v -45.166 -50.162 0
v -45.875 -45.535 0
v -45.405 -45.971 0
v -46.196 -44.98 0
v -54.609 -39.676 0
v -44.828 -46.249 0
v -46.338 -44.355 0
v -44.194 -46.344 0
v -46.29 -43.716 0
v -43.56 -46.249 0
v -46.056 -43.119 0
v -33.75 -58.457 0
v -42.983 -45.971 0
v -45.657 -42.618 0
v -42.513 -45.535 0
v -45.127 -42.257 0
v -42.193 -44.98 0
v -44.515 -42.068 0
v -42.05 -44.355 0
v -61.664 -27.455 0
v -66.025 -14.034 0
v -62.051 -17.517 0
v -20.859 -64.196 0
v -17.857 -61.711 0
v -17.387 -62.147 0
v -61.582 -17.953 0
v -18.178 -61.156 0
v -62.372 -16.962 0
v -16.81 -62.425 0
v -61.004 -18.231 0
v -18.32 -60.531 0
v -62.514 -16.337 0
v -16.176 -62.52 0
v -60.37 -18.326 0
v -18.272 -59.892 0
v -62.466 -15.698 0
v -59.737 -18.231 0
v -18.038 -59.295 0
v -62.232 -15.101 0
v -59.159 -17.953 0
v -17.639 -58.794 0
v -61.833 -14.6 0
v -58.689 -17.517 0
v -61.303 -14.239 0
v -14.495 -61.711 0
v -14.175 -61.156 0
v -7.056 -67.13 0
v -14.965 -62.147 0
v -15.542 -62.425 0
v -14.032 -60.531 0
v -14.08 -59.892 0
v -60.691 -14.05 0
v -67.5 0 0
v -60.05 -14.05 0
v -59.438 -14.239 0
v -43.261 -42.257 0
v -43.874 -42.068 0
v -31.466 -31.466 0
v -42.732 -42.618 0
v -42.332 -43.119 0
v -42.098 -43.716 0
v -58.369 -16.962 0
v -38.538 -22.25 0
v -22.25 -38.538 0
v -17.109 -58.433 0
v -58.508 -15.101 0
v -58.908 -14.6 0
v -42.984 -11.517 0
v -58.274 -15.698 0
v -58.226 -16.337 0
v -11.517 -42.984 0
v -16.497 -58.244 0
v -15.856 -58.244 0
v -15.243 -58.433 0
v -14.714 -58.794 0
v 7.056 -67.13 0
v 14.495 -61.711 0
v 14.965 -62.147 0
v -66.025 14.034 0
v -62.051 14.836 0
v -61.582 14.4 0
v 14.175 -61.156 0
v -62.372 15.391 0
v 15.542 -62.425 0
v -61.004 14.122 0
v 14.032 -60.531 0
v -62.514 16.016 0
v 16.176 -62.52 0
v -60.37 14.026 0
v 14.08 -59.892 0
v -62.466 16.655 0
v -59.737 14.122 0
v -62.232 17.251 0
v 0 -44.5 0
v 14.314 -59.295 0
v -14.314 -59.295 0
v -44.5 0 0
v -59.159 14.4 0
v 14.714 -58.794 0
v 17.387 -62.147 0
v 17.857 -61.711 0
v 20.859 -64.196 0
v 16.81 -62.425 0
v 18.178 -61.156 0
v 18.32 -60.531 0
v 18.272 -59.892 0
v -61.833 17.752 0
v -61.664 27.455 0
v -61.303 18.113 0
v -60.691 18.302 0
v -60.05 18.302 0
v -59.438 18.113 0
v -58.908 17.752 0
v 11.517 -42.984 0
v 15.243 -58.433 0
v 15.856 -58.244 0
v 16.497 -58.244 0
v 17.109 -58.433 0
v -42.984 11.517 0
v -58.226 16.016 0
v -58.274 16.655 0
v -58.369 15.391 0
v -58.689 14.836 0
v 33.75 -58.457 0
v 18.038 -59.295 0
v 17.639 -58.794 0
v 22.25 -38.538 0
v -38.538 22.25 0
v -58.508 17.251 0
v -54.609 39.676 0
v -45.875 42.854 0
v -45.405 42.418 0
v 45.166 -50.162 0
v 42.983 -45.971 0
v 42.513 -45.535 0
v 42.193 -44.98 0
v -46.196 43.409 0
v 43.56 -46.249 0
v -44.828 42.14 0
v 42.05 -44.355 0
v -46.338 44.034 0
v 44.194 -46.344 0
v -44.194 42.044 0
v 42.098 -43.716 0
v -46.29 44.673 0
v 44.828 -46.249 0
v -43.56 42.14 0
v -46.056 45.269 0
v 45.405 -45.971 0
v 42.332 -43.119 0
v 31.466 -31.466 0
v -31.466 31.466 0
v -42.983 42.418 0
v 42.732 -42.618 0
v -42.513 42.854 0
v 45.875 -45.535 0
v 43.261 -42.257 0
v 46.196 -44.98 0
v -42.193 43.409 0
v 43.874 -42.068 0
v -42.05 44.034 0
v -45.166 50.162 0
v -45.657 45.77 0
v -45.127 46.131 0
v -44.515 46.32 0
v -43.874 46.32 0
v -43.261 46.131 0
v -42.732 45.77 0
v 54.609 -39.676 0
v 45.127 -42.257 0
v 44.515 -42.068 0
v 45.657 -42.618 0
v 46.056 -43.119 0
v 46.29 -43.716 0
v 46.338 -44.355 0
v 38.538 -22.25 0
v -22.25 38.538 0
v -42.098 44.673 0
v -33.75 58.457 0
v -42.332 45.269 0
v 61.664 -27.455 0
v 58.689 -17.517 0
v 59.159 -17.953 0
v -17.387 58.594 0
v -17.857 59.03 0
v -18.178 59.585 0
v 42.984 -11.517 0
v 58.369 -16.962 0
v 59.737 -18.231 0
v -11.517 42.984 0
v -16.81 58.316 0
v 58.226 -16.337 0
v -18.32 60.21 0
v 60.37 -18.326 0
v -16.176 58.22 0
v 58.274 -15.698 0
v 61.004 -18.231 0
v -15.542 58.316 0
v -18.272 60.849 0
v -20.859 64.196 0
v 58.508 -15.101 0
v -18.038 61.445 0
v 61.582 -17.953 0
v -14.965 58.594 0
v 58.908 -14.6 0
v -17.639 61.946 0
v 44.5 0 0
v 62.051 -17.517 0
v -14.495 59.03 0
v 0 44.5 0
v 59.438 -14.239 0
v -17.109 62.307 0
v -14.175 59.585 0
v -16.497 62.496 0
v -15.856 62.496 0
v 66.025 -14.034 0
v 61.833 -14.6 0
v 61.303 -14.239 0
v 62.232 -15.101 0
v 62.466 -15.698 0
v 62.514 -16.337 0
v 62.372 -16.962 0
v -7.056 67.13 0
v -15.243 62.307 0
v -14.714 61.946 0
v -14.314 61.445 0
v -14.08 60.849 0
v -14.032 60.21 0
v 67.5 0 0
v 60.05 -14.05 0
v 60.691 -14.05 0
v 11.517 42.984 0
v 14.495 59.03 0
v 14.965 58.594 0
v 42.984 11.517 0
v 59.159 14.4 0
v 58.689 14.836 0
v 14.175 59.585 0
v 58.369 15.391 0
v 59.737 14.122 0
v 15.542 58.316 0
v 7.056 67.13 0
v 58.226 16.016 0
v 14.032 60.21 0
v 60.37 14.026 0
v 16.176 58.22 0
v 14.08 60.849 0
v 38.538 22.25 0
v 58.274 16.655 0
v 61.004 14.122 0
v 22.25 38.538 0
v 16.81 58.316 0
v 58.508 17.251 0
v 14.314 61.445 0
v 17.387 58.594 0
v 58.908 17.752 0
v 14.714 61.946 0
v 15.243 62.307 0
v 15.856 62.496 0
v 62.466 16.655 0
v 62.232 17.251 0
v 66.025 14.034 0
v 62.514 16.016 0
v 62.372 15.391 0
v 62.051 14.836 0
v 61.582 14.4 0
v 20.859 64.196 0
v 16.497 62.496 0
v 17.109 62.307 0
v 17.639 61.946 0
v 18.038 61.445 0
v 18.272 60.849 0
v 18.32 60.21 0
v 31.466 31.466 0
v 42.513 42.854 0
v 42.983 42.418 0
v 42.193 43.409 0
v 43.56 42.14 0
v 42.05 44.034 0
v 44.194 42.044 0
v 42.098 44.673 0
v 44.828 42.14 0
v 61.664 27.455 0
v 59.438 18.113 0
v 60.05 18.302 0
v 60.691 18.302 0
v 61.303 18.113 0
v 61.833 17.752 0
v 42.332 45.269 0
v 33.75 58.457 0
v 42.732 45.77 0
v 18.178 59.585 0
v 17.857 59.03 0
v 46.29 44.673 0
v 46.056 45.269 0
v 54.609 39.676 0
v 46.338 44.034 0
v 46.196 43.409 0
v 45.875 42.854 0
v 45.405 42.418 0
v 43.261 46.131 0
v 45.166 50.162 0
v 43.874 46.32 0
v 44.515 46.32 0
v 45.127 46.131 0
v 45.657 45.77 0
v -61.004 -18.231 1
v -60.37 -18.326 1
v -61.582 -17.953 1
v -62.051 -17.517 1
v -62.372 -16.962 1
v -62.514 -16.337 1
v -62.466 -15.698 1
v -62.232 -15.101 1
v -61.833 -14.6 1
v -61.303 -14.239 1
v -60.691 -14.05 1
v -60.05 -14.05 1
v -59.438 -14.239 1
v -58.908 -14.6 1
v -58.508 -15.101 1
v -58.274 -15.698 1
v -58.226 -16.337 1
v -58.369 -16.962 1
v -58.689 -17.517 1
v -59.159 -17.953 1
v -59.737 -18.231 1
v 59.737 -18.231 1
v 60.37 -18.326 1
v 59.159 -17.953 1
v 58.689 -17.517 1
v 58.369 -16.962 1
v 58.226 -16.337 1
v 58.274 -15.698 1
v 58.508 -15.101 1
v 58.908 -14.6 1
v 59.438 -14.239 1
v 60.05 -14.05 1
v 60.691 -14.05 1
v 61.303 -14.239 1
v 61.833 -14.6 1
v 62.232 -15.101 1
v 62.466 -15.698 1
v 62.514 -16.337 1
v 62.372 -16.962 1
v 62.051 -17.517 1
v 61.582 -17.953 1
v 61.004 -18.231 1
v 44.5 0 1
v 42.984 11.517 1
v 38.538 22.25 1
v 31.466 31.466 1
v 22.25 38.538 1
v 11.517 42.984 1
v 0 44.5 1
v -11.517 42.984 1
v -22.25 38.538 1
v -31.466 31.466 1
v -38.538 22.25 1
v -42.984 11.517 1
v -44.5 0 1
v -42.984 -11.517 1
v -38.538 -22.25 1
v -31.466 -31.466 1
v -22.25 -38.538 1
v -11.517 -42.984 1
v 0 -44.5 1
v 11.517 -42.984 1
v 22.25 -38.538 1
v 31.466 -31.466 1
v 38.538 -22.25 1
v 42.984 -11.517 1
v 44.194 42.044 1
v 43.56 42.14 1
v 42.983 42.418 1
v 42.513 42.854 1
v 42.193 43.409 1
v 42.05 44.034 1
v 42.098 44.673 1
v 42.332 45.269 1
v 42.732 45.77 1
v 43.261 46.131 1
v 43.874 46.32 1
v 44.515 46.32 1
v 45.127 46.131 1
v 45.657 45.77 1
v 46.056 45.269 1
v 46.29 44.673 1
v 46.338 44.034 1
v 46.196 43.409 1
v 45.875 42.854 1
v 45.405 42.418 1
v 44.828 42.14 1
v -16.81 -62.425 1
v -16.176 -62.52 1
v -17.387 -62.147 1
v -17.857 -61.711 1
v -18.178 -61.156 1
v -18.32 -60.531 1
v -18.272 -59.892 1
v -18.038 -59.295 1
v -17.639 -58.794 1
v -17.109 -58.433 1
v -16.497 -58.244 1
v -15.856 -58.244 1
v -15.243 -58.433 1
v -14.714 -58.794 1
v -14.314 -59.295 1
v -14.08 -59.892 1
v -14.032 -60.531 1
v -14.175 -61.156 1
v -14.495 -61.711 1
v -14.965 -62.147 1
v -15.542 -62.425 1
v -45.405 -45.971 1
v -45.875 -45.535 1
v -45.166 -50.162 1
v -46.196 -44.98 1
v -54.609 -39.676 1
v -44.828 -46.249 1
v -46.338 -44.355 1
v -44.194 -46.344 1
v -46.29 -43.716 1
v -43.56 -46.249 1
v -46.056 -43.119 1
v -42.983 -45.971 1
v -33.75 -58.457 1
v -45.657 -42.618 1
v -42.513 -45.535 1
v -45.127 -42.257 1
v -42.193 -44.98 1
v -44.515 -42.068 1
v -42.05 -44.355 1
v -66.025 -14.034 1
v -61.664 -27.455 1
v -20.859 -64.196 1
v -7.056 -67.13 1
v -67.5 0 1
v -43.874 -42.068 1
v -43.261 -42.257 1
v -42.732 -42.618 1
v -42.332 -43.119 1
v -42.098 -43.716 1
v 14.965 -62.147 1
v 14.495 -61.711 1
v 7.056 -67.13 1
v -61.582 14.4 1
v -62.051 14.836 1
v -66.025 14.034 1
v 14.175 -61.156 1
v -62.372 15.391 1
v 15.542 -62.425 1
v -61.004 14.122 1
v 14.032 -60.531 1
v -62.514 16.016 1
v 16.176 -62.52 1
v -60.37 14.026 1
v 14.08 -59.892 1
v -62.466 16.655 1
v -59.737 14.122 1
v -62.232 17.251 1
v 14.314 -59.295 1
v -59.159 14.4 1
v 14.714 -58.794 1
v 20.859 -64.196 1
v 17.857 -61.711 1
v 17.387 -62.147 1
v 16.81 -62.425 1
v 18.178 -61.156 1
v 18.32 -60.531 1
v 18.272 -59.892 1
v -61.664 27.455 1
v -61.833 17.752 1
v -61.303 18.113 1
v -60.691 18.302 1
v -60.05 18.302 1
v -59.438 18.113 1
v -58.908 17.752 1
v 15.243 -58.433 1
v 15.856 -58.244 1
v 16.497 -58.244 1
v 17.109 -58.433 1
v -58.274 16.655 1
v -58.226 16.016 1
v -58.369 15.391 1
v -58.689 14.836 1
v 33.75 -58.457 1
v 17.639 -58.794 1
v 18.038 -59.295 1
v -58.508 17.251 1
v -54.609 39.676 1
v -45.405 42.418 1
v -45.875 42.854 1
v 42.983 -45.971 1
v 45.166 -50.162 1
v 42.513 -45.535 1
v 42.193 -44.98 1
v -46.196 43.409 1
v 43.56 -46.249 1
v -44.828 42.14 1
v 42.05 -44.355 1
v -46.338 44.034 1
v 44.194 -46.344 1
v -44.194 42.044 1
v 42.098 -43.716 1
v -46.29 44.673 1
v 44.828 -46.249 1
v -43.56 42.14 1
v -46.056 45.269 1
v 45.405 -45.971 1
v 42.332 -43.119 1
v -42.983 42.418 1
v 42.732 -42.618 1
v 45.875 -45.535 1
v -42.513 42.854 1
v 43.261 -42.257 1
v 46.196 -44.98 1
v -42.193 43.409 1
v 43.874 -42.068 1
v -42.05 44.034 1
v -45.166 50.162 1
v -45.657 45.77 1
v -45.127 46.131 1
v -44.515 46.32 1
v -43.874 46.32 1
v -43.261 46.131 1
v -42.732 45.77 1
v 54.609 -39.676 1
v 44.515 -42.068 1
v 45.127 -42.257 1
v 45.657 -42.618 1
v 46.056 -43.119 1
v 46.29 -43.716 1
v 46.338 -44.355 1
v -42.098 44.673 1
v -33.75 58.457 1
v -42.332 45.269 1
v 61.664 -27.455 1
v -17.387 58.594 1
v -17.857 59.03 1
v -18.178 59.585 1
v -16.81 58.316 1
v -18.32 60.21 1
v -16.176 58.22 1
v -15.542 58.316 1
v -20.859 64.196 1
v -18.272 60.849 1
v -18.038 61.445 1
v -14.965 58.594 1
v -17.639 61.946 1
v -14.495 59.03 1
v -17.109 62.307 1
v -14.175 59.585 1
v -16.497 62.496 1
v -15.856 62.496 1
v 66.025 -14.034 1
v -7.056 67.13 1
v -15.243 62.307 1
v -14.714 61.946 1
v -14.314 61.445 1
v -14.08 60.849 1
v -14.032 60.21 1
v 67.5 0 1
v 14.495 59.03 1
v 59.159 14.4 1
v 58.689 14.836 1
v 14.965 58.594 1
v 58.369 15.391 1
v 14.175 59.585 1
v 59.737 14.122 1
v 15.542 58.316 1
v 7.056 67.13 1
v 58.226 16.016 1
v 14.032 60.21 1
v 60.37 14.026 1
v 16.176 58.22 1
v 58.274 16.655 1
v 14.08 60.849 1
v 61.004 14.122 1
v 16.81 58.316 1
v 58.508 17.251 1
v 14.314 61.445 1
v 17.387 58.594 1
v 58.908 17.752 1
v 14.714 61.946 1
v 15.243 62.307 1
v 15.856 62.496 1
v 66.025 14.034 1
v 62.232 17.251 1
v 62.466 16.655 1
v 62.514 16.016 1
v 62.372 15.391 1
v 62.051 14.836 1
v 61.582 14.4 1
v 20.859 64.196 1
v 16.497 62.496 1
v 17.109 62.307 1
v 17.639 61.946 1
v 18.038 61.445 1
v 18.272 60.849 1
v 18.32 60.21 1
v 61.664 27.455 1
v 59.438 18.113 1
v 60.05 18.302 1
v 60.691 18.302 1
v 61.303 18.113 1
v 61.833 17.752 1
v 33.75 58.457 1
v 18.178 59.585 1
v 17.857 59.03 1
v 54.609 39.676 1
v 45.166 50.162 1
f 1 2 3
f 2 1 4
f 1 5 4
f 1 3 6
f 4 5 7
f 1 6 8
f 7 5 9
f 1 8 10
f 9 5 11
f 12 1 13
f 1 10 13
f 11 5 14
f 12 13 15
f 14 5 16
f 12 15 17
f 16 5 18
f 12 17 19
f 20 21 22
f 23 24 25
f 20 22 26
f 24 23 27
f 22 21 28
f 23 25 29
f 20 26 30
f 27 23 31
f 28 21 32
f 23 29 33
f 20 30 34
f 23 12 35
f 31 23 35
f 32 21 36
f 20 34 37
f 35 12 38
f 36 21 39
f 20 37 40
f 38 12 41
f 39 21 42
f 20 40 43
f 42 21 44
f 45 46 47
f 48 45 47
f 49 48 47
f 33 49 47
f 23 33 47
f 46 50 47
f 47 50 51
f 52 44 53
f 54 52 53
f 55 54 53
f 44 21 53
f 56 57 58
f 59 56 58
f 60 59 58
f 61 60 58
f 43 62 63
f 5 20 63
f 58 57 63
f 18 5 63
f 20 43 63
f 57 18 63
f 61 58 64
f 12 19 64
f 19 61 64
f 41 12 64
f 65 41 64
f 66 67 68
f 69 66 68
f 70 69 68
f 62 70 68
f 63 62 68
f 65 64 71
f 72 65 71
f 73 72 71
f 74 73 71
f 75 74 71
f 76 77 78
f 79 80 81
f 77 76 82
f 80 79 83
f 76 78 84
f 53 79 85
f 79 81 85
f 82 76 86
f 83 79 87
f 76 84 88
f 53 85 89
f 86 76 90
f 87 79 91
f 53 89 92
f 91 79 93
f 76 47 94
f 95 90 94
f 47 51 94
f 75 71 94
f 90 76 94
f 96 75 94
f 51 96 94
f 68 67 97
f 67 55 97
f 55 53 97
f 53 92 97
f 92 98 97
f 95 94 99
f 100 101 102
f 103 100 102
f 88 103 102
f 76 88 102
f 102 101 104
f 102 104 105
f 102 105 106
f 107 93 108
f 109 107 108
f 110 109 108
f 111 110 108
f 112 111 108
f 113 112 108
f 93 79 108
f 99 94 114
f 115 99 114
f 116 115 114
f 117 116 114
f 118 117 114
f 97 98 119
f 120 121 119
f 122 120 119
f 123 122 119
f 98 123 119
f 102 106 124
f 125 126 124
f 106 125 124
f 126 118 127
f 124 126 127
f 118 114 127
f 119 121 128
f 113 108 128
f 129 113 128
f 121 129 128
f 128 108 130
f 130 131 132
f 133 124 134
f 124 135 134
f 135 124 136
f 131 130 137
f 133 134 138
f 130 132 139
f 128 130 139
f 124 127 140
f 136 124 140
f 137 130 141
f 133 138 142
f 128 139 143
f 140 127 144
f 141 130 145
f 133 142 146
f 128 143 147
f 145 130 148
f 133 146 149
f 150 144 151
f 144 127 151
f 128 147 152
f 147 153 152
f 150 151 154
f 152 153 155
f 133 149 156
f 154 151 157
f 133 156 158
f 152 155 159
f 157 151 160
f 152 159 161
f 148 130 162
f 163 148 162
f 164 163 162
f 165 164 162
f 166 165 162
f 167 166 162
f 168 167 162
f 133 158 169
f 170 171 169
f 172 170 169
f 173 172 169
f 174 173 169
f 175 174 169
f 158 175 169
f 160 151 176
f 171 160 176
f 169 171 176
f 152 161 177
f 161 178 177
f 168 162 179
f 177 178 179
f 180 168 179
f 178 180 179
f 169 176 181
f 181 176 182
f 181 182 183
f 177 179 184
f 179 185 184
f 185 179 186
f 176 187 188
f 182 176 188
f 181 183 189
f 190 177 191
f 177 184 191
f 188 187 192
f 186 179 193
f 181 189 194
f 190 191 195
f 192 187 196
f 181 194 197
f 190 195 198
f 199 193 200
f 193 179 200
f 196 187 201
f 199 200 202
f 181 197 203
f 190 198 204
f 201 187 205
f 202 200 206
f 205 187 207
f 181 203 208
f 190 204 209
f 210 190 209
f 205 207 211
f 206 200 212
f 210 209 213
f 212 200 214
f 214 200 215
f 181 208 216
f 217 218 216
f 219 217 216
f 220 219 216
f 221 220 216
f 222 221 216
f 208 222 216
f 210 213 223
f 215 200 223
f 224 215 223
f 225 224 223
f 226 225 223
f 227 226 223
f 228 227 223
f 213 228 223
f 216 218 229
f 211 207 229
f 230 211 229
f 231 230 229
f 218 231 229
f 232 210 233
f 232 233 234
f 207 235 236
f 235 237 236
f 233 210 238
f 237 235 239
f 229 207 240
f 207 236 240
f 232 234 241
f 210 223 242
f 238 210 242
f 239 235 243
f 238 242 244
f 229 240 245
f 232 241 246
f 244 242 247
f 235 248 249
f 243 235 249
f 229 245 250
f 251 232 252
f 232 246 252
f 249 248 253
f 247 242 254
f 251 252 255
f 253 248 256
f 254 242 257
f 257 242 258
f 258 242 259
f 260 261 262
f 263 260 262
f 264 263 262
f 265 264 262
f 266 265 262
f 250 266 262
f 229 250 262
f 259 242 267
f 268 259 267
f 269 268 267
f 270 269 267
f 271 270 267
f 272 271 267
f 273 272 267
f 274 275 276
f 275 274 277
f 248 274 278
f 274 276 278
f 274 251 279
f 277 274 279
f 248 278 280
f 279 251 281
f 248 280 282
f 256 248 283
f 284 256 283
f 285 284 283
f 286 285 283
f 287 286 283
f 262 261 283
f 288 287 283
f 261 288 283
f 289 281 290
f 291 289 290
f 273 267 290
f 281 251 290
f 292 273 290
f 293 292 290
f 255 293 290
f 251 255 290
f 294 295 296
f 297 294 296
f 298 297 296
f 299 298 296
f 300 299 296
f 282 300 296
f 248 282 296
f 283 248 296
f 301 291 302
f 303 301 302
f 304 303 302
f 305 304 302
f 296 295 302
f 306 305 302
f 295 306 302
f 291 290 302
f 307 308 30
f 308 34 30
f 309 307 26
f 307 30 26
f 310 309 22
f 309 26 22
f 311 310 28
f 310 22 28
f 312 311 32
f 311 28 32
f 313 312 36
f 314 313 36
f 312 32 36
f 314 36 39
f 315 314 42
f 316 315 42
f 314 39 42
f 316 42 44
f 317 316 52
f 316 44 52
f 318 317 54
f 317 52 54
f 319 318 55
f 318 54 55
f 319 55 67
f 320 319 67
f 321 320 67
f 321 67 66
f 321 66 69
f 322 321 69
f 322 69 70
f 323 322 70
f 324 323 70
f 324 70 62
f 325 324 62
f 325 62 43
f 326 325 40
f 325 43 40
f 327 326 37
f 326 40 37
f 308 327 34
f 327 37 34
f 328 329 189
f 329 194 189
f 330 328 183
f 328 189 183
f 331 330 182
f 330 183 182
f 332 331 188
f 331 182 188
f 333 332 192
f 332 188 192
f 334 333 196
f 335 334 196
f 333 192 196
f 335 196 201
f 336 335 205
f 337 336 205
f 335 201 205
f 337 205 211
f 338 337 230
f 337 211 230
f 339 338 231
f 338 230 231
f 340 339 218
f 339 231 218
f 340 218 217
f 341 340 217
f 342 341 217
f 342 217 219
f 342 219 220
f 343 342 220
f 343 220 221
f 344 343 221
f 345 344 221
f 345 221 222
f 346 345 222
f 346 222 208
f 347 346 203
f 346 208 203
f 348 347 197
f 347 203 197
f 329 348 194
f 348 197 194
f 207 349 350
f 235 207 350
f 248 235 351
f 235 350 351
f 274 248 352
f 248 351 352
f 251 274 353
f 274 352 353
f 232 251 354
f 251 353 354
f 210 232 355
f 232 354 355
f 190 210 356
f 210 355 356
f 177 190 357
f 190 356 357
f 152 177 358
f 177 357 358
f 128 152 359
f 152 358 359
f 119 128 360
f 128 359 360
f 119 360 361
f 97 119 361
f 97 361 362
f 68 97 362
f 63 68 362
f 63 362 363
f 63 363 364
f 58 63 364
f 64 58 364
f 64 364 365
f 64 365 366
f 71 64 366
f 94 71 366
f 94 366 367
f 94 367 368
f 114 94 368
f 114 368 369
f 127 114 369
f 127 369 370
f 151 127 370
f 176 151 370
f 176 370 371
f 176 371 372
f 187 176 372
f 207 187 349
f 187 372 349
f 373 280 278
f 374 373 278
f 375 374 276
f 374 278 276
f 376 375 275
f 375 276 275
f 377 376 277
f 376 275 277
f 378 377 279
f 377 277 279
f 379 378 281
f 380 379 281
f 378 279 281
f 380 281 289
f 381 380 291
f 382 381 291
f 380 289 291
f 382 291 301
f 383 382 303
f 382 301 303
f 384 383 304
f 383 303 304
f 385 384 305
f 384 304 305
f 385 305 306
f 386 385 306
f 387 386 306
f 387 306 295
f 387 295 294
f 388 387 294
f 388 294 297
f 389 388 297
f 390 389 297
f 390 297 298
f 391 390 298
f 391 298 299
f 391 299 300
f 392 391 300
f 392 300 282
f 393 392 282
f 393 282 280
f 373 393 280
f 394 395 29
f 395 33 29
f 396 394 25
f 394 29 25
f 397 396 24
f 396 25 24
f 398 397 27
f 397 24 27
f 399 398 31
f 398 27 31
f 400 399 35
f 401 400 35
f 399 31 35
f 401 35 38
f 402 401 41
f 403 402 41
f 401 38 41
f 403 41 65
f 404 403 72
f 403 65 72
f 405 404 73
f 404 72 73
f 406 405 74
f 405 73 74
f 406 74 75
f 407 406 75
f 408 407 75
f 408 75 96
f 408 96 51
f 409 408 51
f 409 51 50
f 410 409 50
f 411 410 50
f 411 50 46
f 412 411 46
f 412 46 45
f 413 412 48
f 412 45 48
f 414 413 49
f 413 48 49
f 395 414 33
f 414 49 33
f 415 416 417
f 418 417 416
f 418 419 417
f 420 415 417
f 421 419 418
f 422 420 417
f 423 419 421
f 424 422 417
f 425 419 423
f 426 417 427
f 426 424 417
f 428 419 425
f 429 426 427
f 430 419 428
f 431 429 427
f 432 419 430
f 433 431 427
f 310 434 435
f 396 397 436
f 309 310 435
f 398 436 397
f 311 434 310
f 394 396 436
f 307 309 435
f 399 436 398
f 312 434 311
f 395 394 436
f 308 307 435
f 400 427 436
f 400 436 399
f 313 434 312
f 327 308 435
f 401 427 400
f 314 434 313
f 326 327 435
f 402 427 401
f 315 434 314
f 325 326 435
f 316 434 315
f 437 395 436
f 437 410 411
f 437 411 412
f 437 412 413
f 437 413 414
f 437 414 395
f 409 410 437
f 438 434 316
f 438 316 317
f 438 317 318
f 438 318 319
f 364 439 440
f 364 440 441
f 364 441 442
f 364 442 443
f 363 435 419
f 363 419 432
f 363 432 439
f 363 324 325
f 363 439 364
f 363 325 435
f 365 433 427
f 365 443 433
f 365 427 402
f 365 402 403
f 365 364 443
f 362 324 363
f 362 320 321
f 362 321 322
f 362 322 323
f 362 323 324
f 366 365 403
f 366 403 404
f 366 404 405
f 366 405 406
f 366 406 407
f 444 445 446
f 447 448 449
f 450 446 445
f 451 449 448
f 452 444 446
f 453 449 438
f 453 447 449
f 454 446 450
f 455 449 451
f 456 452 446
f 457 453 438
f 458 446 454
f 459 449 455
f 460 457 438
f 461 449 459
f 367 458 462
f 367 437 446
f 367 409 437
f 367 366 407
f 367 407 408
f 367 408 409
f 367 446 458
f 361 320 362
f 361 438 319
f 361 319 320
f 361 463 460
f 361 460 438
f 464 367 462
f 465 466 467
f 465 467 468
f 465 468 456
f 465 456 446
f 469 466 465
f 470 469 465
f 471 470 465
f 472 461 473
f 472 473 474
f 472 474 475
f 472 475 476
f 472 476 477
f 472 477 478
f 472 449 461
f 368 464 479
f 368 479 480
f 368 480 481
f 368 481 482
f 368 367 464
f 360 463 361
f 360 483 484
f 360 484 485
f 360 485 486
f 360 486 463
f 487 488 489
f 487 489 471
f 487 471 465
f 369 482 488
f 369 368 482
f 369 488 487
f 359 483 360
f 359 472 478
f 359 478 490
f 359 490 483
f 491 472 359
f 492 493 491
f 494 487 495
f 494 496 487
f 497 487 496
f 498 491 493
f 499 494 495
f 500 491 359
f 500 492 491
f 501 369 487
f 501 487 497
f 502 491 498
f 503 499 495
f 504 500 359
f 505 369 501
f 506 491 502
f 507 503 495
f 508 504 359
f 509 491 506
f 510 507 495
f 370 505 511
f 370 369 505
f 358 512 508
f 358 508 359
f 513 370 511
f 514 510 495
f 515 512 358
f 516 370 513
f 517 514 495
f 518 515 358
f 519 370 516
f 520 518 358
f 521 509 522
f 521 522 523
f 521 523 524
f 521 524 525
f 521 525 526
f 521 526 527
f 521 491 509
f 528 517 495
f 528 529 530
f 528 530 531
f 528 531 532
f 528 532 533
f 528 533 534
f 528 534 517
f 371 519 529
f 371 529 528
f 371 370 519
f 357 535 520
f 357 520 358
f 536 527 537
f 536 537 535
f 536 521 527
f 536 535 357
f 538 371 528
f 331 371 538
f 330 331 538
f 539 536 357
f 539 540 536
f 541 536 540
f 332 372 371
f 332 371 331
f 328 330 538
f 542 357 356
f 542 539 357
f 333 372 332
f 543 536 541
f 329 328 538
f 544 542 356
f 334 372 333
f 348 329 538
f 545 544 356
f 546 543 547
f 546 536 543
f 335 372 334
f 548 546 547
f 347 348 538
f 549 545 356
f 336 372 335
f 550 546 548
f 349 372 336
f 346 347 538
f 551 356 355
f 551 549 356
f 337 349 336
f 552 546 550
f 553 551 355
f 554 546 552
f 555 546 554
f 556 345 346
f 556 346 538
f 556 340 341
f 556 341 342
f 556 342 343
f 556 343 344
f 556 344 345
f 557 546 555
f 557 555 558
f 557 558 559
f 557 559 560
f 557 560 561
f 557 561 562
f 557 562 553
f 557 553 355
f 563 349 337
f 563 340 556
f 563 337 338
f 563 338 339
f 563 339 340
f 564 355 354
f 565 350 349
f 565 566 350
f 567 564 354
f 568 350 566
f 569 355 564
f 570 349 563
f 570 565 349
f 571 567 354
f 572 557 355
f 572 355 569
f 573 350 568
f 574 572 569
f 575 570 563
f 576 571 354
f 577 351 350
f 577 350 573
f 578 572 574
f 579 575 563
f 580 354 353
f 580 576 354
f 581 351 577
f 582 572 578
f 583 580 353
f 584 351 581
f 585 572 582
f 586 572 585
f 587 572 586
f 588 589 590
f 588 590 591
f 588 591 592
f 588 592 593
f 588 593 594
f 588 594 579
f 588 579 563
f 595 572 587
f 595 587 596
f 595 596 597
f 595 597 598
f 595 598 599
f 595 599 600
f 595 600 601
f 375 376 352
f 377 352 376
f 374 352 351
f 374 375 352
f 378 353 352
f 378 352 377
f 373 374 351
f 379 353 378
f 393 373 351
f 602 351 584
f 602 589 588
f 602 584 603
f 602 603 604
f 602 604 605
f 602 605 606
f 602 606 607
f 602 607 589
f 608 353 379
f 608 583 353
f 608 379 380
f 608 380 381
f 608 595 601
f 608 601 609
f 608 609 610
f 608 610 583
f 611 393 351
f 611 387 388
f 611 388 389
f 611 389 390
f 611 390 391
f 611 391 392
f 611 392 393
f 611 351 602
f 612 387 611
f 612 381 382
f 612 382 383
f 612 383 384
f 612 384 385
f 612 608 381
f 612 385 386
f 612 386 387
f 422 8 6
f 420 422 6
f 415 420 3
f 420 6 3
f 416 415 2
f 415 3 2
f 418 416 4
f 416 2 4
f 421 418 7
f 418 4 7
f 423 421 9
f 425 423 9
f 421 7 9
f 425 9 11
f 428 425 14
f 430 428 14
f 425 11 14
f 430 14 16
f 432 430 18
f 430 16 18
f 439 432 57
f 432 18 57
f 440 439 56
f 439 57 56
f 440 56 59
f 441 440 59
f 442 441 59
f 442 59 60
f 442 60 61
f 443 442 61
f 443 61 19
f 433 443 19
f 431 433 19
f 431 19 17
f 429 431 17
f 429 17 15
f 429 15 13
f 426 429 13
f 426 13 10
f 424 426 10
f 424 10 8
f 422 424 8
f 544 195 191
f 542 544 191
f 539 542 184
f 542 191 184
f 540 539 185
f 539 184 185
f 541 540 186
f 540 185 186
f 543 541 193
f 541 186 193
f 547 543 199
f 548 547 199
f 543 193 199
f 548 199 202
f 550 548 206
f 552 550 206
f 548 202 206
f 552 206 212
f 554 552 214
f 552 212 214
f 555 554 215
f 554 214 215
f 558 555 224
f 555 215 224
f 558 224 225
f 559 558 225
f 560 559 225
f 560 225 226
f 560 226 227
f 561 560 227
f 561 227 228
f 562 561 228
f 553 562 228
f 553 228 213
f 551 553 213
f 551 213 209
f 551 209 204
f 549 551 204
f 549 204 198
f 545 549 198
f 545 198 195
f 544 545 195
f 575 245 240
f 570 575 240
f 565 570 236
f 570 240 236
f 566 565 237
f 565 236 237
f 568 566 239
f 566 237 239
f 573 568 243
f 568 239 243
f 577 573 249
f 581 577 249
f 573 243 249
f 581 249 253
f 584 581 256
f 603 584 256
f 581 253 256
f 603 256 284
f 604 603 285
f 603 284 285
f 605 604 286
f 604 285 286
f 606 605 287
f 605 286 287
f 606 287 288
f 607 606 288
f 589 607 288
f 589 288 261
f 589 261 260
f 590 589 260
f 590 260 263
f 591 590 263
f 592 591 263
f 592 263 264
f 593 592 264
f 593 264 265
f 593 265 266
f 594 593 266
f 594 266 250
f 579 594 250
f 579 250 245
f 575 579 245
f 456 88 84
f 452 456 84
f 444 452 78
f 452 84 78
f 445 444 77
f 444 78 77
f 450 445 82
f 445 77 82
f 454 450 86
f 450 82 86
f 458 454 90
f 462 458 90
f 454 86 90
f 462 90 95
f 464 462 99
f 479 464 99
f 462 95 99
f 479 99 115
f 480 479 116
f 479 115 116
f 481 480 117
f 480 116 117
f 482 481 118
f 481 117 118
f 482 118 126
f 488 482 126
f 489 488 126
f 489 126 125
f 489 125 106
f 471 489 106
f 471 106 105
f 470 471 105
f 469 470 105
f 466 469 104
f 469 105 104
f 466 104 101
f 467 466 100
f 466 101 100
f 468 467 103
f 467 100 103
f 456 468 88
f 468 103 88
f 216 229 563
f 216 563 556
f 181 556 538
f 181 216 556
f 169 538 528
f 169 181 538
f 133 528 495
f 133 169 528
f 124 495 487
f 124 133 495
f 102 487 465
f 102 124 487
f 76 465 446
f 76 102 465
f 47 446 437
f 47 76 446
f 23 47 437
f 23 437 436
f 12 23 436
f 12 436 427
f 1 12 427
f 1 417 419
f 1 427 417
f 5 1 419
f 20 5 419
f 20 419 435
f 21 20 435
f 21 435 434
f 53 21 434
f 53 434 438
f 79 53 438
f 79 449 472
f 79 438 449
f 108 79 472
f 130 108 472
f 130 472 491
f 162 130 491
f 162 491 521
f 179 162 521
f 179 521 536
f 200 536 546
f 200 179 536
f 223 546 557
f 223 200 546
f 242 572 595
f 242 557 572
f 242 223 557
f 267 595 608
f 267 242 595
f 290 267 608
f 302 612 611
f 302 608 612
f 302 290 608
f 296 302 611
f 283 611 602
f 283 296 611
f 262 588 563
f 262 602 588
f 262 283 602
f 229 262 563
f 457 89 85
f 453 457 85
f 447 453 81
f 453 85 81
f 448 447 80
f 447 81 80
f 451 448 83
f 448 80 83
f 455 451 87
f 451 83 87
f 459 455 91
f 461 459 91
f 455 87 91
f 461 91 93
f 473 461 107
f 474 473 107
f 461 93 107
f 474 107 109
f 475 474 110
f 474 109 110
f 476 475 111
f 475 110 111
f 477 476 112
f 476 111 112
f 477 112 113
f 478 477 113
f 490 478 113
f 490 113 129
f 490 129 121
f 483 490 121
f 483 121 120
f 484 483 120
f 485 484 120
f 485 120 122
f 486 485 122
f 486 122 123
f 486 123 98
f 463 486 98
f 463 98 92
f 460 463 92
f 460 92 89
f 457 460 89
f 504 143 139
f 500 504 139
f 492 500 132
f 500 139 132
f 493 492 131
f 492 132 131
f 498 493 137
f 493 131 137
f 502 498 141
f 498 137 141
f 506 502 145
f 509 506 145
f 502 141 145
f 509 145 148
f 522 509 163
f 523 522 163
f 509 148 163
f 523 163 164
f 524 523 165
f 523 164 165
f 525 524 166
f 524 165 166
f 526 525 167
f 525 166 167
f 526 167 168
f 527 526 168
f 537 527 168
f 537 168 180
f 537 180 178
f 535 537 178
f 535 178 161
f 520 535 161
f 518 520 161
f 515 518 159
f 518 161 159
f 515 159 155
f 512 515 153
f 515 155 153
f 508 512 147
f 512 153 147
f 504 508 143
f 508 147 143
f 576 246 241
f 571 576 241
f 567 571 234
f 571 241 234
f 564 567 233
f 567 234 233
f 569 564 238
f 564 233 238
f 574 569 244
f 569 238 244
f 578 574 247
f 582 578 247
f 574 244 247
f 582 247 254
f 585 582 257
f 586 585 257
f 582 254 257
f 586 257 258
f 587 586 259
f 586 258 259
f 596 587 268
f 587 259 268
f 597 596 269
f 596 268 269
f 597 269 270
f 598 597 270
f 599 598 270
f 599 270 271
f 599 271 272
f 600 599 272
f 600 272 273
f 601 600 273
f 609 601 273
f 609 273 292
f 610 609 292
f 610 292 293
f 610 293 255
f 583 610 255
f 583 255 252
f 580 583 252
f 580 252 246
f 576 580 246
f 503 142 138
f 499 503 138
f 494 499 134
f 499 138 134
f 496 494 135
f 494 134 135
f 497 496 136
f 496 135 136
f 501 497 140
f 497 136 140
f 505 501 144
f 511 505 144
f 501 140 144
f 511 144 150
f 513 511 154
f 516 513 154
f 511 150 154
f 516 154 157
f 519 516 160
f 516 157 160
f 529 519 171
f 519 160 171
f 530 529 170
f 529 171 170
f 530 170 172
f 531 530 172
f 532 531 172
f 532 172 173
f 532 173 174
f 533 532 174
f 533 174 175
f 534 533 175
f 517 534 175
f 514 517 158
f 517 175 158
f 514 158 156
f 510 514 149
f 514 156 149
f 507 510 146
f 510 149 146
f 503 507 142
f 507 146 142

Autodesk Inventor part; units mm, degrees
ref_plane "YZ Plane" through (0, 0, 0) normal (1, 0, 0) x (0, 1, 0)
ref_plane "XZ Plane" through (0, 0, 0) normal (0, 1, 0) x (-1, 0, 0)
ref_plane "XY Plane" through (0, 0, 0) normal (0, 0, 1) x (1, 0, 0)
sketch "スケッチ4" plane through (0, 0, 1) normal (0, 0, 1) x (1, 0, 0)
  circle A0 centre (16.1762, 60.3704) radius 2.15 projected
  circle A1 centre (-16.1762, 60.3704) radius 2.15 projected
  circle A2 centre (0, 0) radius 67.5 projected
  circle A3 centre (-16.1762, 60.3704) radius 5
  circle A4 centre (16.1762, 60.3704) radius 5
  circle A5 centre (0, 0) radius 62.5
  point P0 (-11.2987, 61.4702)
  point P1 (11.2987, 61.4702)
  point P2 (17.4703, 65.2)
  point P3 (-17.4703, 65.2)
sketch "スケッチ1" plane through (0, 0, 0) normal (0, 0, 1) x (1, 0, 0)
  circle A0 centre (0, 0) radius 67.5
  dimension "d0" = 135
extrude "プレート1" add sketch "スケッチ1" along normal blind 1
sketch "スケッチ2" plane through (0, 0, 1) normal (0, 0, 1) x (1, 0, 0)
  circle A0 centre (0, 0) radius 44.5
  dimension "d2" = 89
extrude "押し出し1" cut sketch "スケッチ2" against normal through all
sketch "スケッチ3" plane through (0, 0, 1) normal (0, 0, 1) x (1, 0, 0)
  circle A0 centre (0, 0) radius 62.5
  point P0 (16.1762, 60.3704)
  point P1 (-16.1762, 60.3704)
  point P2 (-44.1942, 44.1942)
  point P3 (-60.3704, 16.1762)
  point P4 (-60.3704, -16.1762)
  point P5 (-44.1942, -44.1942)
  point P6 (-16.1762, -60.3704)
  point P7 (16.1762, -60.3704)
  point P8 (44.1942, -44.1942)
  point P9 (60.3704, -16.1762)
  point P10 (60.3704, 16.1762)
  point P11 (44.1942, 44.1942)
  dimension "d5" = 125
  dimension "d8" = 360
  dimension "d23" = 0
hole "穴1" at (16.1762, 60.3704, 1) at (-16.1762, 60.3704, 1) at (-44.1942, 44.1942, 1) at (-60.3704, 16.1762, 1) at (-60.3704, -16.1762, 1) at (-44.1942, -44.1942, 1) at (-16.1762, -60.3704, 1) at (16.1762, -60.3704, 1) at (44.1942, -44.1942, 1) at (60.3704, -16.1762, 1) at (60.3704, 16.1762, 1) at (44.1942, 44.1942, 1) direction (0, 0, -1) diameter 4.3 end through all clearance for "Flat Head Machine Screw" size "M4" standard "Ansi Metric M Profile"
equation "\"d15\" = Thickness"
equation "\"d1\" = Thickness"
equation "\"BendRadius\" = Thickness"
equation "\"BendReliefWidth\" = Thickness"
equation "\"BendReliefDepth\" = 0.5 * Thickness"
equation "\"CornerReliefSize\" = 4 * Thickness"
equation "\"MinimumRemnant\" = 2 * Thickness"
equation "\"TransitionRadius\" = BendRadius"
equation "\"JacobiRadiusSize\" = BendRadius"
equation "\"GapSize\" = Thickness"
equation "\"Thickness\" = 1"
properties part number "unit-plate3" material "CFRP"
